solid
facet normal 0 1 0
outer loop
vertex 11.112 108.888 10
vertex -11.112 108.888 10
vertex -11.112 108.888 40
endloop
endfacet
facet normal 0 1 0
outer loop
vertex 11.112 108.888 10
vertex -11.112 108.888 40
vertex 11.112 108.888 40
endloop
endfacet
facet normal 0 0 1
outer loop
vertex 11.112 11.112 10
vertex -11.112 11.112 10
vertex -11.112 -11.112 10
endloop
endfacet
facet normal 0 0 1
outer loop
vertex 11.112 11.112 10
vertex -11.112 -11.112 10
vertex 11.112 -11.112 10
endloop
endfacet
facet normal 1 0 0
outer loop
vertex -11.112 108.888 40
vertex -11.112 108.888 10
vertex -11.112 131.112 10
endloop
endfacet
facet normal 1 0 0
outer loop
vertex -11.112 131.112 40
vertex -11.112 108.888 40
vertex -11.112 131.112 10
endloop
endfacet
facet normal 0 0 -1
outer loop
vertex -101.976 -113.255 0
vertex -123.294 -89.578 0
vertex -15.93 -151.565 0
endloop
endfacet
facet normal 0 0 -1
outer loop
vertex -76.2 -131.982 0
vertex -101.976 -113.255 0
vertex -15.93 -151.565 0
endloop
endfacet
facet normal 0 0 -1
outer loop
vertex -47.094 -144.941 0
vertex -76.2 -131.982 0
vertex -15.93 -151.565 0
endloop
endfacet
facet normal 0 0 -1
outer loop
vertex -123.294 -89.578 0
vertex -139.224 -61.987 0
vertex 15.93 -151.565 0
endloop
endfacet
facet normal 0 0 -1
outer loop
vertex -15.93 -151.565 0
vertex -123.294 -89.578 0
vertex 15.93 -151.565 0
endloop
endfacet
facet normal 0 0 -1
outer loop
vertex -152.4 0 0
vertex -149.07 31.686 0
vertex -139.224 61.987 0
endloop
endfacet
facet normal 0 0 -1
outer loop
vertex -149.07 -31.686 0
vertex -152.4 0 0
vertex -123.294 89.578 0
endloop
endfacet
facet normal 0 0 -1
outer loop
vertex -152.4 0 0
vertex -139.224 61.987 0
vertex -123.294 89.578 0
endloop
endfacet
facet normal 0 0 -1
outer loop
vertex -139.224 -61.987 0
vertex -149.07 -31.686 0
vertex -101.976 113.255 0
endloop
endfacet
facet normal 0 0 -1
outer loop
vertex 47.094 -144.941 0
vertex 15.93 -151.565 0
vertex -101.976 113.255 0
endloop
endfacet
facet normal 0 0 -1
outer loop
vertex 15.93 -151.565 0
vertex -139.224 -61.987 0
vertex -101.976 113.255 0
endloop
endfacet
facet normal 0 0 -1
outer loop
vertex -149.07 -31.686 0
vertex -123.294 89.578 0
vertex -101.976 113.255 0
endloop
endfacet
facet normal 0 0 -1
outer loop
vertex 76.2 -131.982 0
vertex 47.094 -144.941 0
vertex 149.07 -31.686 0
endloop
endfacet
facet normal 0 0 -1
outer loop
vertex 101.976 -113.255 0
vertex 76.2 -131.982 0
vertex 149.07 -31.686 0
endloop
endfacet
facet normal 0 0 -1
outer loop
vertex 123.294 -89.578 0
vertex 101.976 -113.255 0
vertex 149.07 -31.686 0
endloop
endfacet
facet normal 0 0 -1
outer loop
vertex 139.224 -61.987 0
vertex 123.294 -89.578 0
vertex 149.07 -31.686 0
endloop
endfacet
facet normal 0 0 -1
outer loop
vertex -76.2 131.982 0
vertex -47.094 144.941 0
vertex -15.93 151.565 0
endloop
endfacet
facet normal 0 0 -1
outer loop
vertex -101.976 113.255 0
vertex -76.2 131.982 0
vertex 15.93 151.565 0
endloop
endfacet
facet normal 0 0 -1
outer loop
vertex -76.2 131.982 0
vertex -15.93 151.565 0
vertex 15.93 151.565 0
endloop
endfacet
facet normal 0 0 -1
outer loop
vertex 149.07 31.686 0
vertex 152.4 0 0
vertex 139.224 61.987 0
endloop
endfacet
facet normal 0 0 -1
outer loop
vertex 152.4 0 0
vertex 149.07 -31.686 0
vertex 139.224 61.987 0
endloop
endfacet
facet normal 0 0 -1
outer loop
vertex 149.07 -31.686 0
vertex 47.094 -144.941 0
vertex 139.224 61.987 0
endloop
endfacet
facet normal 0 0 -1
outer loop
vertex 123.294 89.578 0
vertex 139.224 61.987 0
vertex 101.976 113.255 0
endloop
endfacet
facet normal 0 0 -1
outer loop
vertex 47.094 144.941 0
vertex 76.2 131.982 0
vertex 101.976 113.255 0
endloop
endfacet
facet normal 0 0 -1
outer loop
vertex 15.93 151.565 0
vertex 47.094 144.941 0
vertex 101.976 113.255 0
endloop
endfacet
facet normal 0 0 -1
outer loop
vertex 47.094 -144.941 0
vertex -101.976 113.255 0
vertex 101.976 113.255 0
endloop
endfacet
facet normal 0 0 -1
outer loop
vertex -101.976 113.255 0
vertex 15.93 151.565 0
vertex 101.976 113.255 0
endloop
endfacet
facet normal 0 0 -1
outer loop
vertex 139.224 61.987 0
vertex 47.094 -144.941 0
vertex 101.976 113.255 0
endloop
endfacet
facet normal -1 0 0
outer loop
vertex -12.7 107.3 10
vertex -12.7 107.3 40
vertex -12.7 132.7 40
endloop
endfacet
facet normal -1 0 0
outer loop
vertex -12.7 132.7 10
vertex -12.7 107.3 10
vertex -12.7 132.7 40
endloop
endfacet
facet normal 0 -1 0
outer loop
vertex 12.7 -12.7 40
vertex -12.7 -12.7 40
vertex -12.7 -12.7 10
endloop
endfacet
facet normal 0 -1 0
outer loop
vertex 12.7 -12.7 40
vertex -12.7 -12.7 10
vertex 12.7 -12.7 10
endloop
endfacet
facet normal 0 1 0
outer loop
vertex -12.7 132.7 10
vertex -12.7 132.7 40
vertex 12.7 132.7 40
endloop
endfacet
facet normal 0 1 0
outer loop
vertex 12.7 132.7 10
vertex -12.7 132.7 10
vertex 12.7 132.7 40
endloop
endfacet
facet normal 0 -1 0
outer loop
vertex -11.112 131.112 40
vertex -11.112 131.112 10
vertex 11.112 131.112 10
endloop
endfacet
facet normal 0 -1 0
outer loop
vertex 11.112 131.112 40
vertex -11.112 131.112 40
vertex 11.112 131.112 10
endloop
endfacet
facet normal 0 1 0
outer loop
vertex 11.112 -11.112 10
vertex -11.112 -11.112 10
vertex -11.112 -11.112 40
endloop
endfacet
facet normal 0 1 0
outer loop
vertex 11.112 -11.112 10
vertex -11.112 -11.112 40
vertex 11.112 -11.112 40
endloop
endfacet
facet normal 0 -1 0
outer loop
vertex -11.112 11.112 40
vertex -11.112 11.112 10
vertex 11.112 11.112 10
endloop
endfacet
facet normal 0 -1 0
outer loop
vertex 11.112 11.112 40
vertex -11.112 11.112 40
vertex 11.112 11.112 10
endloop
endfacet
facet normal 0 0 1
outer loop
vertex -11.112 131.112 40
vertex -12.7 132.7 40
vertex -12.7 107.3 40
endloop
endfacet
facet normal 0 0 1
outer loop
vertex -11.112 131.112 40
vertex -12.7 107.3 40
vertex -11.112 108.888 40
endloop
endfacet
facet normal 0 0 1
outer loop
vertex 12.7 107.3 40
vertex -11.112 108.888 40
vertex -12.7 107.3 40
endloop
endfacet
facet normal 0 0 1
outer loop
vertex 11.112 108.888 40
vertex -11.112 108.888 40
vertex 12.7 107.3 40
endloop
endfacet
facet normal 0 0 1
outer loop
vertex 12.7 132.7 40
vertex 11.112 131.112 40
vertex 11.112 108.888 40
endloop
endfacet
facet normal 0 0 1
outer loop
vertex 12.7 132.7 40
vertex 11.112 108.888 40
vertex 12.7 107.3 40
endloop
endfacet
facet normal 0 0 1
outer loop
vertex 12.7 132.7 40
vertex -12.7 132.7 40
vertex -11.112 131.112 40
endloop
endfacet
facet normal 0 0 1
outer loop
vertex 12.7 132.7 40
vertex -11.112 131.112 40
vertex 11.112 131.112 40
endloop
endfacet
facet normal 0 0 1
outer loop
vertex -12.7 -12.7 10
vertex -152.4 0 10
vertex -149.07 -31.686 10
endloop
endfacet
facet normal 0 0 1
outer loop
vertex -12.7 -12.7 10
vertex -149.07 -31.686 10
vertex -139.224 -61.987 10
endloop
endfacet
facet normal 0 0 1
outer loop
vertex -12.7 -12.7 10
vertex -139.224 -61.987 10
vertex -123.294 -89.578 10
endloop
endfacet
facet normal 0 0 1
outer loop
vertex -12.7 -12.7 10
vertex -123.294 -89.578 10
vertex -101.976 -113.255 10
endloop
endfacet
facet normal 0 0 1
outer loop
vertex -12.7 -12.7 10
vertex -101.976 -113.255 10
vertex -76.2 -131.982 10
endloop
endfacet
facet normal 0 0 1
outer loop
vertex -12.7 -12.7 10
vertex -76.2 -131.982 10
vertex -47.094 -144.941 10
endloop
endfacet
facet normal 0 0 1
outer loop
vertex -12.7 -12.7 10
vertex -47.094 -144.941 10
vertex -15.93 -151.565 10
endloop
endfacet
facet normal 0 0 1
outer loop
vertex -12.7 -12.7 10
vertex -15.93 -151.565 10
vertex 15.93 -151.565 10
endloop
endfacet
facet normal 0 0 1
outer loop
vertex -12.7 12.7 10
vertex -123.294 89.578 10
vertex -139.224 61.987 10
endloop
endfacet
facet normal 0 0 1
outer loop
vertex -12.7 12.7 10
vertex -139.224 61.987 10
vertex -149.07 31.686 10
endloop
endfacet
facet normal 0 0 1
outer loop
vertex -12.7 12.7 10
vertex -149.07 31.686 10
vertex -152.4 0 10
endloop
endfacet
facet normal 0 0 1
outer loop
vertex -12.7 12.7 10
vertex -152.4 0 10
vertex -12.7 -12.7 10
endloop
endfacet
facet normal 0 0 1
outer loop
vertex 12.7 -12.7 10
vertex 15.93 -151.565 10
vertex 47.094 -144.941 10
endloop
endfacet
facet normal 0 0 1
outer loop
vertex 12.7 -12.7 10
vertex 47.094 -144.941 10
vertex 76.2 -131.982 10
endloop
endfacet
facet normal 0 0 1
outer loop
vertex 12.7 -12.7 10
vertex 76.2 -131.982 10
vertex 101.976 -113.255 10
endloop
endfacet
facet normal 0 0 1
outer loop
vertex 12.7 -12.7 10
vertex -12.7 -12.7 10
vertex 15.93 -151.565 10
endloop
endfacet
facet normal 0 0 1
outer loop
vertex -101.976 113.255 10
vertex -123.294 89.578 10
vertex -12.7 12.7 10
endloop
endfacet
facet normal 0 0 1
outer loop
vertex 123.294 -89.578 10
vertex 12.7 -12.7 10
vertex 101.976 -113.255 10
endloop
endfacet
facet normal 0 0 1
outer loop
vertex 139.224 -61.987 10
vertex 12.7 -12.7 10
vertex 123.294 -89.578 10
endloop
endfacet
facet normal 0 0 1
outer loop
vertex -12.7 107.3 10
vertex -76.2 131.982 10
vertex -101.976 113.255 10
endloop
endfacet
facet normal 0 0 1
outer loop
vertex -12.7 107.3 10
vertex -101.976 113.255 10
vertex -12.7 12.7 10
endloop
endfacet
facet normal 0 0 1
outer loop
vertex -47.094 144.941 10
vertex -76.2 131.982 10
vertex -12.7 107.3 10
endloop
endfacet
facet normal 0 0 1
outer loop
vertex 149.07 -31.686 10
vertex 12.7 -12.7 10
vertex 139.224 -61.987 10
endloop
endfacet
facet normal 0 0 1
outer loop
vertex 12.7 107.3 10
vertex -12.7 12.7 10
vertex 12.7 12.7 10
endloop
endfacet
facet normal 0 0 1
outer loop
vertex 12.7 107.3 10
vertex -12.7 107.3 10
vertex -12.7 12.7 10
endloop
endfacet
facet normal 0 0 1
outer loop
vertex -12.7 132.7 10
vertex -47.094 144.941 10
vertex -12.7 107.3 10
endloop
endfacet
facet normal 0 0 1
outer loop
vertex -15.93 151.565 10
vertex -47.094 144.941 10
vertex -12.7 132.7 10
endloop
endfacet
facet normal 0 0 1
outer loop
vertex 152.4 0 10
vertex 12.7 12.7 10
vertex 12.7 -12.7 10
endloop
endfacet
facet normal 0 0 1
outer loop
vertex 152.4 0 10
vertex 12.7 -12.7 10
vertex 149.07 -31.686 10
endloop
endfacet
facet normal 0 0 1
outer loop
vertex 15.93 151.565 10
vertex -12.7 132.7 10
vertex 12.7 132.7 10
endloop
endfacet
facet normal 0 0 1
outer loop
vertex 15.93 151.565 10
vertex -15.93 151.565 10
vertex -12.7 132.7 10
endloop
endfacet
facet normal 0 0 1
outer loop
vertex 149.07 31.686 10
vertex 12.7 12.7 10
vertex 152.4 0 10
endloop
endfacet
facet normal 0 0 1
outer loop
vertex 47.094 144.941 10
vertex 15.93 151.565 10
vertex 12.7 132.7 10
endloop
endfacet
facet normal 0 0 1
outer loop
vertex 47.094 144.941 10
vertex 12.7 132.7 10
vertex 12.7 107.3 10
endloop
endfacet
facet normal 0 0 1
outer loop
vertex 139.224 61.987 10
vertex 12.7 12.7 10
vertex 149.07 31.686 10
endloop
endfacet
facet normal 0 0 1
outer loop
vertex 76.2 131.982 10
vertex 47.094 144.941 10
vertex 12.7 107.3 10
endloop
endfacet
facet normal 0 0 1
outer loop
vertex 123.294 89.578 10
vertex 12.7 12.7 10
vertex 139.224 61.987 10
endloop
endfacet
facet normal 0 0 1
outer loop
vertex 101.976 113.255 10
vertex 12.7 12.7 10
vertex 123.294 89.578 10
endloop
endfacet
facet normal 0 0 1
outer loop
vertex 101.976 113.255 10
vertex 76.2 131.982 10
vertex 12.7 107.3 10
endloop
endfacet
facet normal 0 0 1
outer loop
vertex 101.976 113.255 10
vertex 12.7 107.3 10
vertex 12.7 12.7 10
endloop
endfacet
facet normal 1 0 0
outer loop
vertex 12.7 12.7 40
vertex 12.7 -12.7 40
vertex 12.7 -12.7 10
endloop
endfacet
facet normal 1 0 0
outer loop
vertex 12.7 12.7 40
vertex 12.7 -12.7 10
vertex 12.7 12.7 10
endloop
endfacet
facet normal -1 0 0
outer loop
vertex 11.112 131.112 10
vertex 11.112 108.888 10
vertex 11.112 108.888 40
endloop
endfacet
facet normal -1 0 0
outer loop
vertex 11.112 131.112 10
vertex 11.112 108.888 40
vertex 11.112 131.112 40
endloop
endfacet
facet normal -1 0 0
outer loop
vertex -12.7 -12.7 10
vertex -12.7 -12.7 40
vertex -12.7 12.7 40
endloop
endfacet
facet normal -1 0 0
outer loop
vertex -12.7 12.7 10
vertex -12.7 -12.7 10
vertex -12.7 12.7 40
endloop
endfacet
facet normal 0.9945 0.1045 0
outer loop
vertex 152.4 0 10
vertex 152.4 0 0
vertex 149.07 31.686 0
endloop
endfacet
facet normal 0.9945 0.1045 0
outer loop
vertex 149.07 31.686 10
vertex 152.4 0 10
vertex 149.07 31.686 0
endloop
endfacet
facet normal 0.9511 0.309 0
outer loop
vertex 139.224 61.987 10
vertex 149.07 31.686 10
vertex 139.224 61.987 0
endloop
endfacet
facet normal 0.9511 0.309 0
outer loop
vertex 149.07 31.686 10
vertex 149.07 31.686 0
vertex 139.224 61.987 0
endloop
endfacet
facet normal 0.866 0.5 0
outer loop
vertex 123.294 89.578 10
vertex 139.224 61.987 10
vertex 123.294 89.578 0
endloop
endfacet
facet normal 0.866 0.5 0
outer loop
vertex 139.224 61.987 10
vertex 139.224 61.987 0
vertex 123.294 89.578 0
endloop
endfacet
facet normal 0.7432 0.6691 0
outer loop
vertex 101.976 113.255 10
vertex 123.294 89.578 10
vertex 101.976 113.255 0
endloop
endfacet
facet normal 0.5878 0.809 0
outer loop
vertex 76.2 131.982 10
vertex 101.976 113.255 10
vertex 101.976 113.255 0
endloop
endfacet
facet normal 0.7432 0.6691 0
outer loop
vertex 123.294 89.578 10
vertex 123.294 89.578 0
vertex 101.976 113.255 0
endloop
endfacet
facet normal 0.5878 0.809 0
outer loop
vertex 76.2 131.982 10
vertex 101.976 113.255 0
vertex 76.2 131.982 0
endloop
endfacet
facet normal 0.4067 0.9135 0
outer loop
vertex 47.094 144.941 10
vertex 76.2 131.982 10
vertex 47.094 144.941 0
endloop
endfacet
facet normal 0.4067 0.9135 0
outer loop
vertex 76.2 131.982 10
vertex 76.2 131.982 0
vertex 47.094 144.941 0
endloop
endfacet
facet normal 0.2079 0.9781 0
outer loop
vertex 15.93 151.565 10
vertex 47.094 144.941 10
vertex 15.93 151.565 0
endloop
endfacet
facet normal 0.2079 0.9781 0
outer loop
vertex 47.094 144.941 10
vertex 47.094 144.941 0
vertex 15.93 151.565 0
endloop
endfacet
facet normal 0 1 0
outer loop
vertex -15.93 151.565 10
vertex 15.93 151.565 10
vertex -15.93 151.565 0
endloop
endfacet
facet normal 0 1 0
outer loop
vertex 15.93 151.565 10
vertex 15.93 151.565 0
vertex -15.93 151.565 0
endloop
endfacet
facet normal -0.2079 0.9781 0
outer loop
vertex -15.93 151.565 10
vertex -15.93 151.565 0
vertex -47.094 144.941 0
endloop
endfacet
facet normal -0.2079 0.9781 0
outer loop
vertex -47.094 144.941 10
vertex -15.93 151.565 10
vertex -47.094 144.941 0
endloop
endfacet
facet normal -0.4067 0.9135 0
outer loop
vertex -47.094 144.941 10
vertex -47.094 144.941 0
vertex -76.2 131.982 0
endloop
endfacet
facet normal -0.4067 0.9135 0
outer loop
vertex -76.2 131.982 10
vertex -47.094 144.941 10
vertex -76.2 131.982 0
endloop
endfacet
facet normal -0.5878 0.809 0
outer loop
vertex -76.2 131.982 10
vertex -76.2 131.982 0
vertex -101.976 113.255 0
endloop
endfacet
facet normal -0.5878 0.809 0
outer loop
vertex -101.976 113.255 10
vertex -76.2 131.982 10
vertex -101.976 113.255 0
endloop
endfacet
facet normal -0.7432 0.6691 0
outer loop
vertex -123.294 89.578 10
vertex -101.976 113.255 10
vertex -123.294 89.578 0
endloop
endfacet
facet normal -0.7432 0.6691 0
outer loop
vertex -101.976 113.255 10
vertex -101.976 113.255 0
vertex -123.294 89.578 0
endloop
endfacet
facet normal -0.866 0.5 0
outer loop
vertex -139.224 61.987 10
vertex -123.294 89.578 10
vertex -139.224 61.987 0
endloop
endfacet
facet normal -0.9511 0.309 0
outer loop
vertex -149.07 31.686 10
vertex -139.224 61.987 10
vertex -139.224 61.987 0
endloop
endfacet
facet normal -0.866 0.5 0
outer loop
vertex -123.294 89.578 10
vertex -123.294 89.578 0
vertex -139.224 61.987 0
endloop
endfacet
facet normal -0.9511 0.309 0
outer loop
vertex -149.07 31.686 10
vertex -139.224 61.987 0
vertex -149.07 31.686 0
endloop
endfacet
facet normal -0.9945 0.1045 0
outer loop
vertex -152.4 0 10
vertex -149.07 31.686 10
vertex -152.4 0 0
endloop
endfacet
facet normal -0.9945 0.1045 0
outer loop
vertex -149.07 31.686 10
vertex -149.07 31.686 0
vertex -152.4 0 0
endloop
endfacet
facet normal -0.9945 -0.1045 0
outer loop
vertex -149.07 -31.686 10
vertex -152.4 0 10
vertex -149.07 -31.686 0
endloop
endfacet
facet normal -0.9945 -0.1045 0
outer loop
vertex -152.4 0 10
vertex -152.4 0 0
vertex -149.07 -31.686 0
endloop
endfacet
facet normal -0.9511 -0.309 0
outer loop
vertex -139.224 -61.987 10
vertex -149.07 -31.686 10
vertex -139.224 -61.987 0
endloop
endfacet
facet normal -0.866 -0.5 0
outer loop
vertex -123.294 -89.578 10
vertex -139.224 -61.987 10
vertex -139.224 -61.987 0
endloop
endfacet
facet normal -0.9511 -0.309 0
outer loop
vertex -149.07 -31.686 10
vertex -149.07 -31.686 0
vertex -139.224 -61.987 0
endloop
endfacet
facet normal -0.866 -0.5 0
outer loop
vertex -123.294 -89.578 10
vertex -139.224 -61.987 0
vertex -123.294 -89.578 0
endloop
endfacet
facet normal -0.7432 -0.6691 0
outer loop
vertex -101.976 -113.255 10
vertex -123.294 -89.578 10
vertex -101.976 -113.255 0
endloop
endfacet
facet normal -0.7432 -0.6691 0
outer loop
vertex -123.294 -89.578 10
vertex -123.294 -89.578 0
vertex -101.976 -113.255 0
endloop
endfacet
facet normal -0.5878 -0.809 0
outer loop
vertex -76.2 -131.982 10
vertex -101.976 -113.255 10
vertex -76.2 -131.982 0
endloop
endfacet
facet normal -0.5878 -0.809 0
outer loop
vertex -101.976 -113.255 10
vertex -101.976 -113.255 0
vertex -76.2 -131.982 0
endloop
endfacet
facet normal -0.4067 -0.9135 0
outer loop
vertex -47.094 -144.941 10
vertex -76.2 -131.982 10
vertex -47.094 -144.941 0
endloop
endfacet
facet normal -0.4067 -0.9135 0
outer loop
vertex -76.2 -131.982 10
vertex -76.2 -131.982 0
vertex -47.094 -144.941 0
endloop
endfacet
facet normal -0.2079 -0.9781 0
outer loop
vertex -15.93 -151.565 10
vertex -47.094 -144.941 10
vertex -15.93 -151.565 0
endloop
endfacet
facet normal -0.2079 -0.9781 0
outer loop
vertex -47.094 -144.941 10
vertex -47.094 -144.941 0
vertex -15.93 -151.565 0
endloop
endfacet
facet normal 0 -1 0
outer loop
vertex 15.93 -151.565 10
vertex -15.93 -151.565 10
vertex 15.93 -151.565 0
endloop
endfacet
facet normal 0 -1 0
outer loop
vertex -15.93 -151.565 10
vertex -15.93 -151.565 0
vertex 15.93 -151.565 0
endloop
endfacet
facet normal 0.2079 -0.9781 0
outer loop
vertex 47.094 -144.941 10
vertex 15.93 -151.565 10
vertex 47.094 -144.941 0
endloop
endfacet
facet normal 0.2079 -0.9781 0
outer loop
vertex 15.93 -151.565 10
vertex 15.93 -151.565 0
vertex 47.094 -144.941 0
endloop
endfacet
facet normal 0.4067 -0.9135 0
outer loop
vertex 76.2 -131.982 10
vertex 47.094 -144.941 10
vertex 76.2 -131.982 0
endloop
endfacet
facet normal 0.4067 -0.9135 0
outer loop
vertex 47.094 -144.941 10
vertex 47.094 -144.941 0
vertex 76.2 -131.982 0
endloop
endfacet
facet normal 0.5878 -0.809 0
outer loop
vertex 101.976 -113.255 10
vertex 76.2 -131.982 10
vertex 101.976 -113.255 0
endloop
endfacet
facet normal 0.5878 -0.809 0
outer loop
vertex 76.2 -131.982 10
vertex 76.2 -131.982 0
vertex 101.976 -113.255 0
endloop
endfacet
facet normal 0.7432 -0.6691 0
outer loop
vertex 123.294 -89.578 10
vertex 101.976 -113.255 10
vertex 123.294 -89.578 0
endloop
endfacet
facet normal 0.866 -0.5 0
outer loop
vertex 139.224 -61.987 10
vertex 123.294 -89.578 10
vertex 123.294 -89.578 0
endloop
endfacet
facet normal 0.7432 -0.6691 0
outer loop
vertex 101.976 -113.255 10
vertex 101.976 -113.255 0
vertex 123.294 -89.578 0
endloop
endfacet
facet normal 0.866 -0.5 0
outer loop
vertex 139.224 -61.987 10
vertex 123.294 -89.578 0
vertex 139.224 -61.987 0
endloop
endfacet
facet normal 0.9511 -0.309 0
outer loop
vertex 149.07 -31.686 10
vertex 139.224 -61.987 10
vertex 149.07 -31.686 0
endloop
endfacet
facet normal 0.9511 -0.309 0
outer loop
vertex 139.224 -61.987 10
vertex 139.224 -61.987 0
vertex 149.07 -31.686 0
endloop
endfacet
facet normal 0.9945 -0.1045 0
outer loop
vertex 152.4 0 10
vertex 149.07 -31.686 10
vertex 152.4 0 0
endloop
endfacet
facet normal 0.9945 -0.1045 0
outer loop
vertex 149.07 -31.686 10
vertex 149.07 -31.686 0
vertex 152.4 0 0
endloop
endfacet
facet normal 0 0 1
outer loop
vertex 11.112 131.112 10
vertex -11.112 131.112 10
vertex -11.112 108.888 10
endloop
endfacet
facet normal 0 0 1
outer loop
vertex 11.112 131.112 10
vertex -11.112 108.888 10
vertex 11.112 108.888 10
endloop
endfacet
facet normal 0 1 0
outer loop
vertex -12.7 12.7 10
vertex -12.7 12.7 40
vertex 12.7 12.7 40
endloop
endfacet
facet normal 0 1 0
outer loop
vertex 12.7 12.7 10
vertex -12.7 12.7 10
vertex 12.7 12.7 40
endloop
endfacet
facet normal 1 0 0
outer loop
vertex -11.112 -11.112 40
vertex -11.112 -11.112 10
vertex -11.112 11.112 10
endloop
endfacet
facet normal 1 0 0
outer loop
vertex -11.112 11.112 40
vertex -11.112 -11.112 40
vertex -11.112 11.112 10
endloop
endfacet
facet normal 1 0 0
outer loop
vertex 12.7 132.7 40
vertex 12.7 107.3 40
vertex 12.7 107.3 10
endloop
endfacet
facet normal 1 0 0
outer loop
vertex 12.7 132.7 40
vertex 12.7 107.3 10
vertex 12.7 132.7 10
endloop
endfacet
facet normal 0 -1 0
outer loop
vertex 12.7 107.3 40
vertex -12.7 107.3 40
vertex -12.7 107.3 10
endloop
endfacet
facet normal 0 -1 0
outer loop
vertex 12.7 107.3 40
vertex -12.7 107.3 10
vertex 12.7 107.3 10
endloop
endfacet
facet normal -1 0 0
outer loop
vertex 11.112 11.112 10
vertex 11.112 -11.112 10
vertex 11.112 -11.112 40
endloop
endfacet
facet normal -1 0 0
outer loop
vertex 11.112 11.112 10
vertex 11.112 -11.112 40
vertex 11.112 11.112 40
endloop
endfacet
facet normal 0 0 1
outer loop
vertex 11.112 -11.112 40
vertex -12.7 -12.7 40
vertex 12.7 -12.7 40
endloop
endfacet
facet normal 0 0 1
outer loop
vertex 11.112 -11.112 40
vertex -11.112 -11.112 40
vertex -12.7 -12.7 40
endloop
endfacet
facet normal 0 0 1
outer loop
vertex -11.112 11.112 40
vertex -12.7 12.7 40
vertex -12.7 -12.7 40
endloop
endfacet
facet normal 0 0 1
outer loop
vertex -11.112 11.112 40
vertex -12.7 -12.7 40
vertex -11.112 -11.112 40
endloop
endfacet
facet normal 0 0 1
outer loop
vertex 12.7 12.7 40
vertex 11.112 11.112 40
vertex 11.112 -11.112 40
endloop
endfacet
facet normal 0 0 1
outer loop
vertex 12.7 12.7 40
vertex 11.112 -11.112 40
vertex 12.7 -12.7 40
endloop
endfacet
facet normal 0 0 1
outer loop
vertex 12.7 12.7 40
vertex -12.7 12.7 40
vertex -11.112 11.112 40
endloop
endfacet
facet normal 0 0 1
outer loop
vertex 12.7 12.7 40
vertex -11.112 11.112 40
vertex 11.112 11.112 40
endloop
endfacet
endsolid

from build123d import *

# Parameters (mm, degrees)
SKETCH1_R           = 152.4
BOSS_EXTRUDE1_DEPTH = 10
SKETCH2_W           = 25.4
SKETCH2_H           = 25.4
SKETCH2_W_2         = 22.225
SKETCH2_H_2         = 22.225
BOSS_EXTRUDE2_DEPTH = 30


with BuildPart() as part:
    # Sketch1 → Boss-Extrude1 (new body)
    with BuildSketch(Plane.XY):
        Circle(SKETCH1_R)
    extrude(amount=BOSS_EXTRUDE1_DEPTH)

    # Sketch2 → Boss-Extrude2 (add)
    # profile 1 of 2: a face of its own
    with BuildSketch(Plane.XY.offset(10)):
        Rectangle(SKETCH2_W, SKETCH2_H)
        Rectangle(SKETCH2_W_2, SKETCH2_H_2, mode=Mode.SUBTRACT)
    # profile 2 of 2: a face of its own
    with BuildSketch(Plane.XY.offset(10)):
        with Locations((0, 120)):
            Rectangle(SKETCH2_W, SKETCH2_H)
        with Locations((0, 120)):
            Rectangle(SKETCH2_W_2, SKETCH2_H_2, mode=Mode.SUBTRACT)
    extrude(amount=BOSS_EXTRUDE2_DEPTH)


solid = part.part
